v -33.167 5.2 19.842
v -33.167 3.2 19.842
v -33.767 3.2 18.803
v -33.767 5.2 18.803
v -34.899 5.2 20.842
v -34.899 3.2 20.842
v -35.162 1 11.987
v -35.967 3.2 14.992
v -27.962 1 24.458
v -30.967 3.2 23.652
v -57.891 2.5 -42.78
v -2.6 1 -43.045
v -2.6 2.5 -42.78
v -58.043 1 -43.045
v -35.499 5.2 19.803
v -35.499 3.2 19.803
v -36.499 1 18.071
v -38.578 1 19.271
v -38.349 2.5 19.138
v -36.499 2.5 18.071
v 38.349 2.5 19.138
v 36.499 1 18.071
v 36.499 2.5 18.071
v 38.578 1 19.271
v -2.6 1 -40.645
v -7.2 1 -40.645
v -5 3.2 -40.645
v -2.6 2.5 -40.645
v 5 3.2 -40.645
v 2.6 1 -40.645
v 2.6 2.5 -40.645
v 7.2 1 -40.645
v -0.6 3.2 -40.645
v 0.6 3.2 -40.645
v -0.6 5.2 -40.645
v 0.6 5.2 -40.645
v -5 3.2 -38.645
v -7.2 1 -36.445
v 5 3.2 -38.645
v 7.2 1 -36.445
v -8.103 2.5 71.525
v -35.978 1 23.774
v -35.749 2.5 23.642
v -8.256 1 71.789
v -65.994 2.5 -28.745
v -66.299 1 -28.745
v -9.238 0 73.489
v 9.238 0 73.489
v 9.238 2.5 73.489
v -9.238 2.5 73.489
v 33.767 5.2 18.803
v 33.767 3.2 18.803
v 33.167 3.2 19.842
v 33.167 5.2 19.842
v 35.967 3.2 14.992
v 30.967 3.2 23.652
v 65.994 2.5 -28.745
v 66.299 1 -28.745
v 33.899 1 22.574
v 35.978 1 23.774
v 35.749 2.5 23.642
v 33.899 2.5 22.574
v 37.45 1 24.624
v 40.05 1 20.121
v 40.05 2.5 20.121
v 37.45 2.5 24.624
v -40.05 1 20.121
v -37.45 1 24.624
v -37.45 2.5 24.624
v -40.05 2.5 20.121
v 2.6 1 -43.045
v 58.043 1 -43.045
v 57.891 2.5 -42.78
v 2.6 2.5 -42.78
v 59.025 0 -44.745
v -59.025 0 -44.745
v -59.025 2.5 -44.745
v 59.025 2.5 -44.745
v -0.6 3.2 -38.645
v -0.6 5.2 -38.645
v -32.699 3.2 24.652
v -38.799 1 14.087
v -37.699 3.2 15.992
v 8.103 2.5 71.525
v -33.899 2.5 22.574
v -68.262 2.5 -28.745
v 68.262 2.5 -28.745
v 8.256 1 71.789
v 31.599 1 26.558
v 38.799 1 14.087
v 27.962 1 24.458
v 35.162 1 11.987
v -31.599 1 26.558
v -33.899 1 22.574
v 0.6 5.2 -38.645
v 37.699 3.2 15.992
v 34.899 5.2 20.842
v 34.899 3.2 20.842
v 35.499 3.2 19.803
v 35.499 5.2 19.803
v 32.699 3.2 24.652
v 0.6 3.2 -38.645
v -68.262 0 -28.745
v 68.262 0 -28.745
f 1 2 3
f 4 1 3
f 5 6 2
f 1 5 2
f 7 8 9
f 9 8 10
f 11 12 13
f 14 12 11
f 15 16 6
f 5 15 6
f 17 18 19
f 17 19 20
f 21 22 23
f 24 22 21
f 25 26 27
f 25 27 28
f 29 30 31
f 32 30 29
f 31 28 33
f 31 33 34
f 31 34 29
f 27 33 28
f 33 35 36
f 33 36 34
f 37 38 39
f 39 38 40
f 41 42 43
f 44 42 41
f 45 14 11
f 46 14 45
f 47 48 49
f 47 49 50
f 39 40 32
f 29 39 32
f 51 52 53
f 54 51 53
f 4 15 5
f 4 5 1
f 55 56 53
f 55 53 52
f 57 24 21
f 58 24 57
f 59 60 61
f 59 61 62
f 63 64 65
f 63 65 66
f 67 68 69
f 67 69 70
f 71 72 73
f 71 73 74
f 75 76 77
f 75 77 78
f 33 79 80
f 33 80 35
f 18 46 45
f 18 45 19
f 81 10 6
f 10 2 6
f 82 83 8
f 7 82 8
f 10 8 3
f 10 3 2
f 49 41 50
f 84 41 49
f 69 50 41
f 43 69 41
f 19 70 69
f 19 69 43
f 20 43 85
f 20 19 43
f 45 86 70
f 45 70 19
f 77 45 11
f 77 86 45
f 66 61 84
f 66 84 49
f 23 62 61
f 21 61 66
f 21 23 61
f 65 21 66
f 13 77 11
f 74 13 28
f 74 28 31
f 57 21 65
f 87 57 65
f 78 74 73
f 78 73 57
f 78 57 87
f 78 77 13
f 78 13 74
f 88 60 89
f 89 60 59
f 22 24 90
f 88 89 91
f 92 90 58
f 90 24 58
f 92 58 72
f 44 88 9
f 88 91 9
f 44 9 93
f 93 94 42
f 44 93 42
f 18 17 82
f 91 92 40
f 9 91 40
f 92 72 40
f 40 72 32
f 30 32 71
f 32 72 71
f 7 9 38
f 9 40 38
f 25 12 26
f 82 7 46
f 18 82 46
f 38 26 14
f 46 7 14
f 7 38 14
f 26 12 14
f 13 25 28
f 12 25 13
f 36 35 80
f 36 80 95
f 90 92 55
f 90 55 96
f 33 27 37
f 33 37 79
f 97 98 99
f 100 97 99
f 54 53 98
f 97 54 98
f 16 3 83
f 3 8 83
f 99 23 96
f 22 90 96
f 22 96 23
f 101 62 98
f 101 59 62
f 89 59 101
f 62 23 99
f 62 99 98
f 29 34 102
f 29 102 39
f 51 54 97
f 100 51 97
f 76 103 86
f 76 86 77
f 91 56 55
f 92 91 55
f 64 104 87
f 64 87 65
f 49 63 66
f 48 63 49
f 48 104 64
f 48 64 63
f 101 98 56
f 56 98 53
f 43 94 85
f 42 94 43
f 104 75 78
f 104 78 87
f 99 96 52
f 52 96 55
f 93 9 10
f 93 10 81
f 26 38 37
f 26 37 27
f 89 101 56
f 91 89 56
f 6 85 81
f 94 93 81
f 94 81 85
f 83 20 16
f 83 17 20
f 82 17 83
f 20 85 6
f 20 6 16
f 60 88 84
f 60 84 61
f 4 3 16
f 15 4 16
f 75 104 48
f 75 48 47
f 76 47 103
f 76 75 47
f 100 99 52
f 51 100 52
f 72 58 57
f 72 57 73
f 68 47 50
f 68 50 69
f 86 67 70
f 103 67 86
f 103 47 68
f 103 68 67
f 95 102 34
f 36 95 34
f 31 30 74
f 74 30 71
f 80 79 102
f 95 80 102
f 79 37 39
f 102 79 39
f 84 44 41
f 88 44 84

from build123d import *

# Parameters (mm, degrees)
BOSS_EXTRU_2_DEPTH              = 1
EXTRU_MINCE1_DEPTH              = 1.5
EXTRU_MINCE1_DRAFT              = -10
ENL_V_DE_MAT_EXTRU_MINCE1_DEPTH = 101.734373448
ESQUISSE7_W                     = 5.2
ESQUISSE7_H                     = 4.1
BOSS_EXTRU_5_DEPTH              = 1.5
ESQUISSE8_W                     = 10
ESQUISSE8_H                     = 2
BOSS_EXTRU_6_DEPTH              = 2.2
CHANFREIN1_SIZE                 = 2.2
ESQUISSE9_W                     = 1.2
ESQUISSE9_H                     = 2
BOSS_EXTRU_7_DEPTH              = 2


with BuildPart() as part:
    # Esquisse2 → Boss.-Extru.2 (new body)
    with BuildSketch(Plane(origin=(0, 0, 0), x_dir=(1, 0, 0), z_dir=(0, 1, 0))):
        Polygon((-68.262395693, 28.744645862), (-59.024791386, 44.744645862), (59.024791386, 44.744645862), (68.262395693, 28.744645862), (9.237604307, -73.489291724), (-9.237604307, -73.489291724), align=None)
    extrude(amount=BOSS_EXTRU_2_DEPTH)


with BuildPart() as extru_mince1_tool:
    # Esquisse5 → Extru.-Mince1 (with draft: the straight prism first)
    with BuildSketch(Plane(origin=(0, 1, 0), x_dir=(1, 0, 0), z_dir=(0, 1, 0))):
        Polygon((-68.262395693, 28.744645862), (-9.237604307, -73.489291724), (9.237604307, -73.489291724), (68.262395693, 28.744645862), (59.024791386, 44.744645862), (-59.024791386, 44.744645862), align=None)
        Polygon((-66.299404778, 28.744645862), (-8.256108849, -71.789291724), (8.256108849, -71.789291724), (66.299404778, 28.744645862), (58.043295928, 43.044645862), (-58.043295928, 43.044645862), align=None, mode=Mode.SUBTRACT)
    extrude(amount=EXTRU_MINCE1_DEPTH)
    # Extru.-Mince1: the draft: its side faces are tilted about the plane it starts from
    extru_mince1_sides = [extru_mince1_tool.faces().sort_by_distance(p)[0] for p in [
        (-38.75, 1.75, 22.372322931),
        (0, 1.75, 73.489291724),
        (38.75, 1.75, 22.372322931),
        (63.643593539, 1.75, -36.744645862),
        (0, 1.75, -44.744645862),
        (-63.643593539, 1.75, -36.744645862),
        (-62.171350353, 1.75, -35.894645862),
        (0, 1.75, -43.044645862),
        (62.171350353, 1.75, -35.894645862),
        (37.277756814, 1.75, 21.522322931),
        (0, 1.75, 71.789291724),
        (-37.277756814, 1.75, 21.522322931),
    ]]
    draft(extru_mince1_sides, Plane(origin=(0, 1, 0), x_dir=(1, 0, 0), z_dir=(0, 1, 0)), EXTRU_MINCE1_DRAFT)


with BuildPart() as part_1:
    add(part.part)

    # Extru.-Mince1: add extru_mince1_tool
    add(extru_mince1_tool.part)

    # Esquisse6 → Enlèv. de mat.-Extru.-Mince1 (cut, through all)
    with BuildSketch(Plane.XZ):
        Polygon((-59.89081679, -46.244645862), (59.89081679, -46.244645862), (69.994446501, -28.744645862), (10.103629711, 74.989291724), (-10.103629711, 74.989291724), (-69.994446501, -28.744645862), align=None)
        Polygon((-59.024791386, -44.744645862), (59.024791386, -44.744645862), (68.262395693, -28.744645862), (9.237604307, 73.489291724), (-9.237604307, 73.489291724), (-68.262395693, -28.744645862), align=None, mode=Mode.SUBTRACT)
    extrude(amount=-ENL_V_DE_MAT_EXTRU_MINCE1_DEPTH, mode=Mode.SUBTRACT)

    # Esquisse7 → Boss.-Extru.5 (add)
    with BuildSketch(Plane(origin=(0, 1, 0), x_dir=(1, 0, 0), z_dir=(0, 1, 0))):
        with Locations((0, 42.694645862)):
            Rectangle(ESQUISSE7_W, ESQUISSE7_H)
        Polygon((33.899295844, -22.573988981), (36.499295844, -18.070656881), (40.05, -20.120656881), (37.45, -24.623988981), align=None)
        Polygon((-36.499295844, -18.070656881), (-33.899295844, -22.573988981), (-37.45, -24.623988981), (-40.05, -20.120656881), align=None)
    extrude(amount=BOSS_EXTRU_5_DEPTH)

    # Esquisse8 → Boss.-Extru.6 (add)
    with BuildSketch(Plane(origin=(0, 1, 0), x_dir=(1, 0, 0), z_dir=(0, 1, 0))):
        with Locations((0, 39.644645862)):
            Rectangle(ESQUISSE8_W, ESQUISSE8_H)
        Polygon((37.699295844, -15.992195912), (32.699295844, -24.65244995), (30.967245037, -23.65244995), (35.967245037, -14.992195912), align=None)
        Polygon((-32.699295844, -24.65244995), (-37.699295844, -15.992195912), (-35.967245037, -14.992195912), (-30.967245037, -23.65244995), align=None)
    extrude(amount=BOSS_EXTRU_6_DEPTH)

    # Chanfrein1
    chanfrein1_edges = [part_1.edges().sort_by_distance(p)[0] for p in [
        (-31.833270441, 1, 24.15244995),
        (-36.833270441, 1, 15.492195912),
        (-33.467245037, 1, 19.322322931),
        (36.833270441, 1, 15.492195912),
        (33.467245037, 1, 19.322322931),
        (31.833270441, 1, 24.15244995),
        (5, 1, -39.644645862),
        (-5, 1, -39.644645862),
        (0, 1, -38.644645862),
    ]]
    chamfer(chanfrein1_edges, length=CHANFREIN1_SIZE - 0.0001)  # a hair under: the kernel refuses the full size

    # Esquisse9 → Boss.-Extru.7 (add)
    with BuildSketch(Plane(origin=(0, 3.2, 0), x_dir=(1, 0, 0), z_dir=(0, 1, 0))):
        with Locations((0, 39.644645862)):
            Rectangle(ESQUISSE9_W, ESQUISSE9_H)
        Polygon((34.899295844, -20.841938173), (35.499295844, -19.802707689), (33.767245037, -18.802707689), (33.167245037, -19.841938173), align=None)
        Polygon((-35.499295844, -19.802707689), (-34.899295844, -20.841938173), (-33.167245037, -19.841938173), (-33.767245037, -18.802707689), align=None)
    extrude(amount=BOSS_EXTRU_7_DEPTH)


solid = part_1.part
